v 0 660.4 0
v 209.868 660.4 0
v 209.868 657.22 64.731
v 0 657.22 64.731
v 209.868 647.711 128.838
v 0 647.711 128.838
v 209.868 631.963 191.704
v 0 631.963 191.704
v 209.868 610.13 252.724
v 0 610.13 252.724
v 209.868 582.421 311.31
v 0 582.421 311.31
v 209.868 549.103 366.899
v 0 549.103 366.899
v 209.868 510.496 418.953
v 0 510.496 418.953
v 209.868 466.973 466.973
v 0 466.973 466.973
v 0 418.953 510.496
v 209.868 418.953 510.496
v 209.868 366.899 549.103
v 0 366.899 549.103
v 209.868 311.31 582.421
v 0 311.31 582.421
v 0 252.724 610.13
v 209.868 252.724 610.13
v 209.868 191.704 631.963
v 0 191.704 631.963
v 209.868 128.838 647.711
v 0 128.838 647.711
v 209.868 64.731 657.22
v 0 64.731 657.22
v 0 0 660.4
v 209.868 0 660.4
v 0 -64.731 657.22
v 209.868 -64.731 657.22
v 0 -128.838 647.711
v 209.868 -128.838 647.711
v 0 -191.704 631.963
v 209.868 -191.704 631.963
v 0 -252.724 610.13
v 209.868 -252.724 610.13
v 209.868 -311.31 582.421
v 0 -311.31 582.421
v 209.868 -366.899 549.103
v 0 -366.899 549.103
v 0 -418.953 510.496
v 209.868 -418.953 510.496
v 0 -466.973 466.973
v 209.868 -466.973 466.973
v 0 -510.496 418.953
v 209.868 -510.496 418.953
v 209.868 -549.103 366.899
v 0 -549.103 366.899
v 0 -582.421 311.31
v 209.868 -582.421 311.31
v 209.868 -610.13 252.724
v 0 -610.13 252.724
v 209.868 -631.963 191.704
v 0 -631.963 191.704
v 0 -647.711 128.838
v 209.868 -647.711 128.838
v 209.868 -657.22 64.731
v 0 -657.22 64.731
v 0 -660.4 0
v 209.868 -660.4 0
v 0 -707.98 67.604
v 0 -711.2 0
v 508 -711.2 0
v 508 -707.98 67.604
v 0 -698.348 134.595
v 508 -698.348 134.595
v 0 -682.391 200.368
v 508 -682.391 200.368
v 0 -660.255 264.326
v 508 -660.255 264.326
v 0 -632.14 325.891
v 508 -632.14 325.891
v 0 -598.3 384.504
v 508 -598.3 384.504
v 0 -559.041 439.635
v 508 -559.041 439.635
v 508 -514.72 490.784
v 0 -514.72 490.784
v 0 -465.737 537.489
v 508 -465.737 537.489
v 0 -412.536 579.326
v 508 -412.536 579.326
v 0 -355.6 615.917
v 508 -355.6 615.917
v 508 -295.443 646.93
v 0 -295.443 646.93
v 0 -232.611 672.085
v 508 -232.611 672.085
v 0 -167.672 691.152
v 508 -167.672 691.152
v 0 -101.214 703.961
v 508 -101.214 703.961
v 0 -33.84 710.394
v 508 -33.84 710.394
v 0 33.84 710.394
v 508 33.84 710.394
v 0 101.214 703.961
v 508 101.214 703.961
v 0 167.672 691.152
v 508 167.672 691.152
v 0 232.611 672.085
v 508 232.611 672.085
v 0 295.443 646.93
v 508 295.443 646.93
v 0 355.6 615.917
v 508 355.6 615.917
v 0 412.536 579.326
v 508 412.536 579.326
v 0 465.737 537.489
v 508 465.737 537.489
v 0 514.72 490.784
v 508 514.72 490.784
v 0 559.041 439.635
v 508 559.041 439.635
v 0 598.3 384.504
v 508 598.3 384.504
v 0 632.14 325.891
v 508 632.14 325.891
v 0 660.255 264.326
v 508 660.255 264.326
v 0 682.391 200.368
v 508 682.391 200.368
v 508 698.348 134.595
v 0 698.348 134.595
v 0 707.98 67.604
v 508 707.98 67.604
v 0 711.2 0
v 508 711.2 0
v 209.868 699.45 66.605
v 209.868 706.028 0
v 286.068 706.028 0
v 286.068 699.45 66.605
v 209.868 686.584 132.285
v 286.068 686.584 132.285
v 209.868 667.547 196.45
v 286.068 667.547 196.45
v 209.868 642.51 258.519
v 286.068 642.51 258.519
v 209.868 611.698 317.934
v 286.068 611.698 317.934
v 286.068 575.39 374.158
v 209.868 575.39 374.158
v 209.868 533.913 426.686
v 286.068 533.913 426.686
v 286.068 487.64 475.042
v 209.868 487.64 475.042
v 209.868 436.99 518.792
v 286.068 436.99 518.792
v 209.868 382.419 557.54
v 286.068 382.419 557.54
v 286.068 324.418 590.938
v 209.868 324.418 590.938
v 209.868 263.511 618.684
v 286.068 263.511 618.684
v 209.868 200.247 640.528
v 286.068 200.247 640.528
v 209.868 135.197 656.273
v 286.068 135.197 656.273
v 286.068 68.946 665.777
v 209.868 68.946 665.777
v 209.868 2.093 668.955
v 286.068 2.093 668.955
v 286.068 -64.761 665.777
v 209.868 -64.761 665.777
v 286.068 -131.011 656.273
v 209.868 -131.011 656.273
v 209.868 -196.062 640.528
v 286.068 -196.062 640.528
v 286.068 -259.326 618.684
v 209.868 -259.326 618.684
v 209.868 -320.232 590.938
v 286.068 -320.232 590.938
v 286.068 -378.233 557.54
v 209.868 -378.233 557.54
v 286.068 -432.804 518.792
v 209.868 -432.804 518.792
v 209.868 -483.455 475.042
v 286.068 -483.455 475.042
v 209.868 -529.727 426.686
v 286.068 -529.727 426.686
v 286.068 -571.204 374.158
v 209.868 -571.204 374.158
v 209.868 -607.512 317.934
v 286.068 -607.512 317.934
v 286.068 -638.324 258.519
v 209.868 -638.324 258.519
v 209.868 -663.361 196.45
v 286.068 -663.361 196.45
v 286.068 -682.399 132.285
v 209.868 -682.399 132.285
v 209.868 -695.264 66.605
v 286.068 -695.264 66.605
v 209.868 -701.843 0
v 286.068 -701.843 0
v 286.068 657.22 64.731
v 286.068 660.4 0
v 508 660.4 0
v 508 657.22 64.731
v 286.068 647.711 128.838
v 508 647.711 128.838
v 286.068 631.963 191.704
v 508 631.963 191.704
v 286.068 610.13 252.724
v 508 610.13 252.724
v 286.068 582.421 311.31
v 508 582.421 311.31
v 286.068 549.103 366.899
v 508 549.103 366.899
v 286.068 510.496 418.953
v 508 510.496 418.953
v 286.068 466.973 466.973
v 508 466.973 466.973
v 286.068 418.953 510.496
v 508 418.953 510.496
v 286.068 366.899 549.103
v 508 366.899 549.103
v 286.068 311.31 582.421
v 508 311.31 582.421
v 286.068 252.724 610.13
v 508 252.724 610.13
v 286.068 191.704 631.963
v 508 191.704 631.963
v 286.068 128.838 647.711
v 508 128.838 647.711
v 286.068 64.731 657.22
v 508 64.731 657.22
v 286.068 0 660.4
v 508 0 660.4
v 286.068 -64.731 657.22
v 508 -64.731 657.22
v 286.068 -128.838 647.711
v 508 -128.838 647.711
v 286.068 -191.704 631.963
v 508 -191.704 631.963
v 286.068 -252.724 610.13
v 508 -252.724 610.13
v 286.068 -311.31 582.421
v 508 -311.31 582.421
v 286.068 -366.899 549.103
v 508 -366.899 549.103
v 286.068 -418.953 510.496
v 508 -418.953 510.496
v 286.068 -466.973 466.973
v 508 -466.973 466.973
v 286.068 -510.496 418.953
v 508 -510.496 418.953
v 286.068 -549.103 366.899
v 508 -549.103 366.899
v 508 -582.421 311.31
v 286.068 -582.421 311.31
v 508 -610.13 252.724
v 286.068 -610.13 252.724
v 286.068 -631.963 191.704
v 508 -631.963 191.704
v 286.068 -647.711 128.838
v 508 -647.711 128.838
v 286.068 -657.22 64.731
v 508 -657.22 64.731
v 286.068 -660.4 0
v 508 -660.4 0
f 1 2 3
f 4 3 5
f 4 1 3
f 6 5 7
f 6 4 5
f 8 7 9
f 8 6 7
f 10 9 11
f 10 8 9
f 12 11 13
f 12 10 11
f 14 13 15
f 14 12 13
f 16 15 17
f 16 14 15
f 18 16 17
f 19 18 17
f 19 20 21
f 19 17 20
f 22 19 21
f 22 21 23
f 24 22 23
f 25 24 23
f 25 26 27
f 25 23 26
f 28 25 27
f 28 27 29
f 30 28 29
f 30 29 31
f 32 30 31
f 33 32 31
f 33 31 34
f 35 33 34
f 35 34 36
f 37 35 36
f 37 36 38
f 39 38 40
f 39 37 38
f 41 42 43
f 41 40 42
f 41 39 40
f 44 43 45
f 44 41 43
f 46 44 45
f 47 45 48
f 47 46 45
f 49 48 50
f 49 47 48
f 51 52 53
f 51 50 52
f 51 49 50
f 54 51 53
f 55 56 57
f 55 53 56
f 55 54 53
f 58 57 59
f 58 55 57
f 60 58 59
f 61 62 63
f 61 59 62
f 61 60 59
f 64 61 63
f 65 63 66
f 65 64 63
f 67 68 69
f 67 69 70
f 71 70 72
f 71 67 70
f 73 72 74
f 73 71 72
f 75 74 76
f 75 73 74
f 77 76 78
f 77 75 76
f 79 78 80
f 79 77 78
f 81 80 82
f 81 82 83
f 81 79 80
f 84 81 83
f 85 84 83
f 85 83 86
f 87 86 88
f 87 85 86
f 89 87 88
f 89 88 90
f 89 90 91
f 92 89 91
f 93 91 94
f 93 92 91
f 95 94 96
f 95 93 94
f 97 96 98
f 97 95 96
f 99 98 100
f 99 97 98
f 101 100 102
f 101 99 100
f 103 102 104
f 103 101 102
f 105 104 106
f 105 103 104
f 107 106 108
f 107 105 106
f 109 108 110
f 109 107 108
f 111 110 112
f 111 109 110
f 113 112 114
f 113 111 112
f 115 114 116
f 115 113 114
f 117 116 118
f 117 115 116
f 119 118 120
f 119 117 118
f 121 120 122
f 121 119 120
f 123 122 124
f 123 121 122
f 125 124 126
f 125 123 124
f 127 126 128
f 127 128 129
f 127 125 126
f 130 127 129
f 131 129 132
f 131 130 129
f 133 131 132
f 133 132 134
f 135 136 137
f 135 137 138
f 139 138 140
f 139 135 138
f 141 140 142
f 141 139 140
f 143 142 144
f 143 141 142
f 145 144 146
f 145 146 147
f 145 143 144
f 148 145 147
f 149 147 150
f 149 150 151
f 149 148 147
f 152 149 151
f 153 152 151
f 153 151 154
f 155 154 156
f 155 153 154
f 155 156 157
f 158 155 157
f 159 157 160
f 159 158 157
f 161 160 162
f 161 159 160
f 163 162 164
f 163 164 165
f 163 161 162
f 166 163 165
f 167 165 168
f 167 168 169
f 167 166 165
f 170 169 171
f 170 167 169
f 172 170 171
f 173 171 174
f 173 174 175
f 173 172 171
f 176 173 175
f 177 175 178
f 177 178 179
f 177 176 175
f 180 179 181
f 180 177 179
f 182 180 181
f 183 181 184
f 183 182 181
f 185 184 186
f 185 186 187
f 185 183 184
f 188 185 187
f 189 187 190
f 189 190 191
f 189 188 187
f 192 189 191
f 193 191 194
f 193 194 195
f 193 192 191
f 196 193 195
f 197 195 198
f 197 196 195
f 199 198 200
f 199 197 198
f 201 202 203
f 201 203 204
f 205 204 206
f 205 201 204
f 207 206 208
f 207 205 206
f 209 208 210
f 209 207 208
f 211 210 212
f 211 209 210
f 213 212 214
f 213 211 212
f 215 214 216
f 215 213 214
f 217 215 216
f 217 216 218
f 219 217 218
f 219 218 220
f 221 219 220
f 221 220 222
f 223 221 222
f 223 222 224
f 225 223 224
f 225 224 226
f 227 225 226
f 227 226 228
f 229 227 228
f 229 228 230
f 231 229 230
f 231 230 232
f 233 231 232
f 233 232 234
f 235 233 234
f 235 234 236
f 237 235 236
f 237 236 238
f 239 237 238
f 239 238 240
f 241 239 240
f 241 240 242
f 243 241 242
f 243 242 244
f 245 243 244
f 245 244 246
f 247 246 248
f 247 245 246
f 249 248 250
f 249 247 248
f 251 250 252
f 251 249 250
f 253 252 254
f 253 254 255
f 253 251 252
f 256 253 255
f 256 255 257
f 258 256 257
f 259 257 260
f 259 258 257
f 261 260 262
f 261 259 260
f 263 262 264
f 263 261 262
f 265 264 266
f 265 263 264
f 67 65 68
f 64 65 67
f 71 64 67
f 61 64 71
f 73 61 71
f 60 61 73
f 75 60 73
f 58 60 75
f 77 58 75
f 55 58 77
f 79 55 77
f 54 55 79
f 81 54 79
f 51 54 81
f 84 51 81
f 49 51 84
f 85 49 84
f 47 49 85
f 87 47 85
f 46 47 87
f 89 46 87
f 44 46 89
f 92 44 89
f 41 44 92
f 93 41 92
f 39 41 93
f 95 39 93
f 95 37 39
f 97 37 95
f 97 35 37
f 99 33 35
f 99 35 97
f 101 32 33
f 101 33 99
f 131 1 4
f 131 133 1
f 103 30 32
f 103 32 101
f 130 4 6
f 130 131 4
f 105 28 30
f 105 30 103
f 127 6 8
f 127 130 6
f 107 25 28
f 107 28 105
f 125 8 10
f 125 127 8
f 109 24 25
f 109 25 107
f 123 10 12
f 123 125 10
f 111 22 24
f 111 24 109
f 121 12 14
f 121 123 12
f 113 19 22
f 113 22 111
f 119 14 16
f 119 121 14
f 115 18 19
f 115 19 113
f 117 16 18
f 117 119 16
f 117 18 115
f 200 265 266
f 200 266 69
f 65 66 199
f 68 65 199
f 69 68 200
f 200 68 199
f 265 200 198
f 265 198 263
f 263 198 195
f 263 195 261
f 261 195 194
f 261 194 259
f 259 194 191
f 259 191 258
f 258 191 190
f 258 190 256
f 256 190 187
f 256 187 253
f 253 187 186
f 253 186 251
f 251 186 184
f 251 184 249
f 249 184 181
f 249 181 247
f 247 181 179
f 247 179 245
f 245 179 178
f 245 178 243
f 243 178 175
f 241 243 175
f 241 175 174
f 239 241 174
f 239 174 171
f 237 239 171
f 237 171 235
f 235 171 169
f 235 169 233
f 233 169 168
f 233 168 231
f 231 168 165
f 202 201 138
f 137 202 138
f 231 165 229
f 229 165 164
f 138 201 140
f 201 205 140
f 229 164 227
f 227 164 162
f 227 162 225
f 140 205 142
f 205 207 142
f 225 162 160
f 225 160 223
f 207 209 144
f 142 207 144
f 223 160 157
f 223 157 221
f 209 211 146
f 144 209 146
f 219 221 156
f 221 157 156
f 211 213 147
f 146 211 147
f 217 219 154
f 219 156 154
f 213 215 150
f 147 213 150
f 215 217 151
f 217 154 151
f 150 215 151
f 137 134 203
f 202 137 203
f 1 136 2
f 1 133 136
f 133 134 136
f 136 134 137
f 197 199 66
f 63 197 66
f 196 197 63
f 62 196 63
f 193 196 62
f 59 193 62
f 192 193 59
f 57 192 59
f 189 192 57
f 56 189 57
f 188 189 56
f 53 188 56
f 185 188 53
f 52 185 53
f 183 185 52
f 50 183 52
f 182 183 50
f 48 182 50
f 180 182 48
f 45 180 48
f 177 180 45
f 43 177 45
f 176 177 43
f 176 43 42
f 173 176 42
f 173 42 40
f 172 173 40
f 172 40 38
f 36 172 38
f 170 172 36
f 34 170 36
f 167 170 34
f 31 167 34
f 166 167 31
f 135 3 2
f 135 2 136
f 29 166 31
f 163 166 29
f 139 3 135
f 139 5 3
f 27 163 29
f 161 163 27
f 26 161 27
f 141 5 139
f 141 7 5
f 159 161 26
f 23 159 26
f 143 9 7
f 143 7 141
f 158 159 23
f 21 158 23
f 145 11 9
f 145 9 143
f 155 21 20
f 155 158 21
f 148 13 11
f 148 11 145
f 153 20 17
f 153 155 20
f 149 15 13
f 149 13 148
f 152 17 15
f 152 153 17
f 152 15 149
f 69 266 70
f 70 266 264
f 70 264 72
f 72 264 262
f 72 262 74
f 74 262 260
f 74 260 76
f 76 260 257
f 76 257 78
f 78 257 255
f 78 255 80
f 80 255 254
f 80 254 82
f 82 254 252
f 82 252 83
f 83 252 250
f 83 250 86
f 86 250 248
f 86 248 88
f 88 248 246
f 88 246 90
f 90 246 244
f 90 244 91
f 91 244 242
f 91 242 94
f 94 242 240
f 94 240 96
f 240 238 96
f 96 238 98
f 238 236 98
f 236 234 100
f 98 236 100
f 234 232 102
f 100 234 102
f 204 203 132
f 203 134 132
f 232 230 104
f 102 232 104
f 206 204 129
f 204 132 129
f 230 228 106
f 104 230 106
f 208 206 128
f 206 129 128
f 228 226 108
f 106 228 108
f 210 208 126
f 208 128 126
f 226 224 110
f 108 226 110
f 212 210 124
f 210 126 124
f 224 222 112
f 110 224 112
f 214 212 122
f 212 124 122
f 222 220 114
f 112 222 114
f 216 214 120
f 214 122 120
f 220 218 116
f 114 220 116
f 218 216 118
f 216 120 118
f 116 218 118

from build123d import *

# Parameters (mm, degrees)
EXTRUDE_THIN1_DEPTH = 508
CAVITY2_START       = 209.868015847
CAVITY2_DEPTH       = 76.2


# Read off the part's stored shape, not the designer's step: Cavity2
with BuildPart() as part:
    # Sketch1 → Extrude-Thin1 (new body)
    with BuildSketch(Plane(origin=(0, 0, 0), x_dir=(0, 0, -1), z_dir=(1, 0, 0))):
        with BuildLine():
            ThreePointArc((0, 660.4), (-660.4, 0), (0, -660.4))
            Line((0, -660.4), (0, -711.2))
            ThreePointArc((0, -711.2), (-711.2, 0), (0, 711.2))
            Line((0, 711.2), (0, 660.4))
        make_face()
    extrude(amount=EXTRUDE_THIN1_DEPTH)

    # Cavity2 outline → Cavity2 (cut)
    with BuildSketch(Plane.YZ.offset(CAVITY2_START)):
        with BuildLine():
            ThreePointArc((706.028233309, 0), (2.092834501, 668.954640909), (-701.842564308, 0))
            Line((-701.842564308, 0), (-660.4, 0))
            ThreePointArc((-660.4, 0), (0, 660.4), (660.4, 0))
            Line((660.4, 0), (706.028233309, 0))
        make_face()
    extrude(amount=CAVITY2_DEPTH, mode=Mode.SUBTRACT)


solid = part.part
